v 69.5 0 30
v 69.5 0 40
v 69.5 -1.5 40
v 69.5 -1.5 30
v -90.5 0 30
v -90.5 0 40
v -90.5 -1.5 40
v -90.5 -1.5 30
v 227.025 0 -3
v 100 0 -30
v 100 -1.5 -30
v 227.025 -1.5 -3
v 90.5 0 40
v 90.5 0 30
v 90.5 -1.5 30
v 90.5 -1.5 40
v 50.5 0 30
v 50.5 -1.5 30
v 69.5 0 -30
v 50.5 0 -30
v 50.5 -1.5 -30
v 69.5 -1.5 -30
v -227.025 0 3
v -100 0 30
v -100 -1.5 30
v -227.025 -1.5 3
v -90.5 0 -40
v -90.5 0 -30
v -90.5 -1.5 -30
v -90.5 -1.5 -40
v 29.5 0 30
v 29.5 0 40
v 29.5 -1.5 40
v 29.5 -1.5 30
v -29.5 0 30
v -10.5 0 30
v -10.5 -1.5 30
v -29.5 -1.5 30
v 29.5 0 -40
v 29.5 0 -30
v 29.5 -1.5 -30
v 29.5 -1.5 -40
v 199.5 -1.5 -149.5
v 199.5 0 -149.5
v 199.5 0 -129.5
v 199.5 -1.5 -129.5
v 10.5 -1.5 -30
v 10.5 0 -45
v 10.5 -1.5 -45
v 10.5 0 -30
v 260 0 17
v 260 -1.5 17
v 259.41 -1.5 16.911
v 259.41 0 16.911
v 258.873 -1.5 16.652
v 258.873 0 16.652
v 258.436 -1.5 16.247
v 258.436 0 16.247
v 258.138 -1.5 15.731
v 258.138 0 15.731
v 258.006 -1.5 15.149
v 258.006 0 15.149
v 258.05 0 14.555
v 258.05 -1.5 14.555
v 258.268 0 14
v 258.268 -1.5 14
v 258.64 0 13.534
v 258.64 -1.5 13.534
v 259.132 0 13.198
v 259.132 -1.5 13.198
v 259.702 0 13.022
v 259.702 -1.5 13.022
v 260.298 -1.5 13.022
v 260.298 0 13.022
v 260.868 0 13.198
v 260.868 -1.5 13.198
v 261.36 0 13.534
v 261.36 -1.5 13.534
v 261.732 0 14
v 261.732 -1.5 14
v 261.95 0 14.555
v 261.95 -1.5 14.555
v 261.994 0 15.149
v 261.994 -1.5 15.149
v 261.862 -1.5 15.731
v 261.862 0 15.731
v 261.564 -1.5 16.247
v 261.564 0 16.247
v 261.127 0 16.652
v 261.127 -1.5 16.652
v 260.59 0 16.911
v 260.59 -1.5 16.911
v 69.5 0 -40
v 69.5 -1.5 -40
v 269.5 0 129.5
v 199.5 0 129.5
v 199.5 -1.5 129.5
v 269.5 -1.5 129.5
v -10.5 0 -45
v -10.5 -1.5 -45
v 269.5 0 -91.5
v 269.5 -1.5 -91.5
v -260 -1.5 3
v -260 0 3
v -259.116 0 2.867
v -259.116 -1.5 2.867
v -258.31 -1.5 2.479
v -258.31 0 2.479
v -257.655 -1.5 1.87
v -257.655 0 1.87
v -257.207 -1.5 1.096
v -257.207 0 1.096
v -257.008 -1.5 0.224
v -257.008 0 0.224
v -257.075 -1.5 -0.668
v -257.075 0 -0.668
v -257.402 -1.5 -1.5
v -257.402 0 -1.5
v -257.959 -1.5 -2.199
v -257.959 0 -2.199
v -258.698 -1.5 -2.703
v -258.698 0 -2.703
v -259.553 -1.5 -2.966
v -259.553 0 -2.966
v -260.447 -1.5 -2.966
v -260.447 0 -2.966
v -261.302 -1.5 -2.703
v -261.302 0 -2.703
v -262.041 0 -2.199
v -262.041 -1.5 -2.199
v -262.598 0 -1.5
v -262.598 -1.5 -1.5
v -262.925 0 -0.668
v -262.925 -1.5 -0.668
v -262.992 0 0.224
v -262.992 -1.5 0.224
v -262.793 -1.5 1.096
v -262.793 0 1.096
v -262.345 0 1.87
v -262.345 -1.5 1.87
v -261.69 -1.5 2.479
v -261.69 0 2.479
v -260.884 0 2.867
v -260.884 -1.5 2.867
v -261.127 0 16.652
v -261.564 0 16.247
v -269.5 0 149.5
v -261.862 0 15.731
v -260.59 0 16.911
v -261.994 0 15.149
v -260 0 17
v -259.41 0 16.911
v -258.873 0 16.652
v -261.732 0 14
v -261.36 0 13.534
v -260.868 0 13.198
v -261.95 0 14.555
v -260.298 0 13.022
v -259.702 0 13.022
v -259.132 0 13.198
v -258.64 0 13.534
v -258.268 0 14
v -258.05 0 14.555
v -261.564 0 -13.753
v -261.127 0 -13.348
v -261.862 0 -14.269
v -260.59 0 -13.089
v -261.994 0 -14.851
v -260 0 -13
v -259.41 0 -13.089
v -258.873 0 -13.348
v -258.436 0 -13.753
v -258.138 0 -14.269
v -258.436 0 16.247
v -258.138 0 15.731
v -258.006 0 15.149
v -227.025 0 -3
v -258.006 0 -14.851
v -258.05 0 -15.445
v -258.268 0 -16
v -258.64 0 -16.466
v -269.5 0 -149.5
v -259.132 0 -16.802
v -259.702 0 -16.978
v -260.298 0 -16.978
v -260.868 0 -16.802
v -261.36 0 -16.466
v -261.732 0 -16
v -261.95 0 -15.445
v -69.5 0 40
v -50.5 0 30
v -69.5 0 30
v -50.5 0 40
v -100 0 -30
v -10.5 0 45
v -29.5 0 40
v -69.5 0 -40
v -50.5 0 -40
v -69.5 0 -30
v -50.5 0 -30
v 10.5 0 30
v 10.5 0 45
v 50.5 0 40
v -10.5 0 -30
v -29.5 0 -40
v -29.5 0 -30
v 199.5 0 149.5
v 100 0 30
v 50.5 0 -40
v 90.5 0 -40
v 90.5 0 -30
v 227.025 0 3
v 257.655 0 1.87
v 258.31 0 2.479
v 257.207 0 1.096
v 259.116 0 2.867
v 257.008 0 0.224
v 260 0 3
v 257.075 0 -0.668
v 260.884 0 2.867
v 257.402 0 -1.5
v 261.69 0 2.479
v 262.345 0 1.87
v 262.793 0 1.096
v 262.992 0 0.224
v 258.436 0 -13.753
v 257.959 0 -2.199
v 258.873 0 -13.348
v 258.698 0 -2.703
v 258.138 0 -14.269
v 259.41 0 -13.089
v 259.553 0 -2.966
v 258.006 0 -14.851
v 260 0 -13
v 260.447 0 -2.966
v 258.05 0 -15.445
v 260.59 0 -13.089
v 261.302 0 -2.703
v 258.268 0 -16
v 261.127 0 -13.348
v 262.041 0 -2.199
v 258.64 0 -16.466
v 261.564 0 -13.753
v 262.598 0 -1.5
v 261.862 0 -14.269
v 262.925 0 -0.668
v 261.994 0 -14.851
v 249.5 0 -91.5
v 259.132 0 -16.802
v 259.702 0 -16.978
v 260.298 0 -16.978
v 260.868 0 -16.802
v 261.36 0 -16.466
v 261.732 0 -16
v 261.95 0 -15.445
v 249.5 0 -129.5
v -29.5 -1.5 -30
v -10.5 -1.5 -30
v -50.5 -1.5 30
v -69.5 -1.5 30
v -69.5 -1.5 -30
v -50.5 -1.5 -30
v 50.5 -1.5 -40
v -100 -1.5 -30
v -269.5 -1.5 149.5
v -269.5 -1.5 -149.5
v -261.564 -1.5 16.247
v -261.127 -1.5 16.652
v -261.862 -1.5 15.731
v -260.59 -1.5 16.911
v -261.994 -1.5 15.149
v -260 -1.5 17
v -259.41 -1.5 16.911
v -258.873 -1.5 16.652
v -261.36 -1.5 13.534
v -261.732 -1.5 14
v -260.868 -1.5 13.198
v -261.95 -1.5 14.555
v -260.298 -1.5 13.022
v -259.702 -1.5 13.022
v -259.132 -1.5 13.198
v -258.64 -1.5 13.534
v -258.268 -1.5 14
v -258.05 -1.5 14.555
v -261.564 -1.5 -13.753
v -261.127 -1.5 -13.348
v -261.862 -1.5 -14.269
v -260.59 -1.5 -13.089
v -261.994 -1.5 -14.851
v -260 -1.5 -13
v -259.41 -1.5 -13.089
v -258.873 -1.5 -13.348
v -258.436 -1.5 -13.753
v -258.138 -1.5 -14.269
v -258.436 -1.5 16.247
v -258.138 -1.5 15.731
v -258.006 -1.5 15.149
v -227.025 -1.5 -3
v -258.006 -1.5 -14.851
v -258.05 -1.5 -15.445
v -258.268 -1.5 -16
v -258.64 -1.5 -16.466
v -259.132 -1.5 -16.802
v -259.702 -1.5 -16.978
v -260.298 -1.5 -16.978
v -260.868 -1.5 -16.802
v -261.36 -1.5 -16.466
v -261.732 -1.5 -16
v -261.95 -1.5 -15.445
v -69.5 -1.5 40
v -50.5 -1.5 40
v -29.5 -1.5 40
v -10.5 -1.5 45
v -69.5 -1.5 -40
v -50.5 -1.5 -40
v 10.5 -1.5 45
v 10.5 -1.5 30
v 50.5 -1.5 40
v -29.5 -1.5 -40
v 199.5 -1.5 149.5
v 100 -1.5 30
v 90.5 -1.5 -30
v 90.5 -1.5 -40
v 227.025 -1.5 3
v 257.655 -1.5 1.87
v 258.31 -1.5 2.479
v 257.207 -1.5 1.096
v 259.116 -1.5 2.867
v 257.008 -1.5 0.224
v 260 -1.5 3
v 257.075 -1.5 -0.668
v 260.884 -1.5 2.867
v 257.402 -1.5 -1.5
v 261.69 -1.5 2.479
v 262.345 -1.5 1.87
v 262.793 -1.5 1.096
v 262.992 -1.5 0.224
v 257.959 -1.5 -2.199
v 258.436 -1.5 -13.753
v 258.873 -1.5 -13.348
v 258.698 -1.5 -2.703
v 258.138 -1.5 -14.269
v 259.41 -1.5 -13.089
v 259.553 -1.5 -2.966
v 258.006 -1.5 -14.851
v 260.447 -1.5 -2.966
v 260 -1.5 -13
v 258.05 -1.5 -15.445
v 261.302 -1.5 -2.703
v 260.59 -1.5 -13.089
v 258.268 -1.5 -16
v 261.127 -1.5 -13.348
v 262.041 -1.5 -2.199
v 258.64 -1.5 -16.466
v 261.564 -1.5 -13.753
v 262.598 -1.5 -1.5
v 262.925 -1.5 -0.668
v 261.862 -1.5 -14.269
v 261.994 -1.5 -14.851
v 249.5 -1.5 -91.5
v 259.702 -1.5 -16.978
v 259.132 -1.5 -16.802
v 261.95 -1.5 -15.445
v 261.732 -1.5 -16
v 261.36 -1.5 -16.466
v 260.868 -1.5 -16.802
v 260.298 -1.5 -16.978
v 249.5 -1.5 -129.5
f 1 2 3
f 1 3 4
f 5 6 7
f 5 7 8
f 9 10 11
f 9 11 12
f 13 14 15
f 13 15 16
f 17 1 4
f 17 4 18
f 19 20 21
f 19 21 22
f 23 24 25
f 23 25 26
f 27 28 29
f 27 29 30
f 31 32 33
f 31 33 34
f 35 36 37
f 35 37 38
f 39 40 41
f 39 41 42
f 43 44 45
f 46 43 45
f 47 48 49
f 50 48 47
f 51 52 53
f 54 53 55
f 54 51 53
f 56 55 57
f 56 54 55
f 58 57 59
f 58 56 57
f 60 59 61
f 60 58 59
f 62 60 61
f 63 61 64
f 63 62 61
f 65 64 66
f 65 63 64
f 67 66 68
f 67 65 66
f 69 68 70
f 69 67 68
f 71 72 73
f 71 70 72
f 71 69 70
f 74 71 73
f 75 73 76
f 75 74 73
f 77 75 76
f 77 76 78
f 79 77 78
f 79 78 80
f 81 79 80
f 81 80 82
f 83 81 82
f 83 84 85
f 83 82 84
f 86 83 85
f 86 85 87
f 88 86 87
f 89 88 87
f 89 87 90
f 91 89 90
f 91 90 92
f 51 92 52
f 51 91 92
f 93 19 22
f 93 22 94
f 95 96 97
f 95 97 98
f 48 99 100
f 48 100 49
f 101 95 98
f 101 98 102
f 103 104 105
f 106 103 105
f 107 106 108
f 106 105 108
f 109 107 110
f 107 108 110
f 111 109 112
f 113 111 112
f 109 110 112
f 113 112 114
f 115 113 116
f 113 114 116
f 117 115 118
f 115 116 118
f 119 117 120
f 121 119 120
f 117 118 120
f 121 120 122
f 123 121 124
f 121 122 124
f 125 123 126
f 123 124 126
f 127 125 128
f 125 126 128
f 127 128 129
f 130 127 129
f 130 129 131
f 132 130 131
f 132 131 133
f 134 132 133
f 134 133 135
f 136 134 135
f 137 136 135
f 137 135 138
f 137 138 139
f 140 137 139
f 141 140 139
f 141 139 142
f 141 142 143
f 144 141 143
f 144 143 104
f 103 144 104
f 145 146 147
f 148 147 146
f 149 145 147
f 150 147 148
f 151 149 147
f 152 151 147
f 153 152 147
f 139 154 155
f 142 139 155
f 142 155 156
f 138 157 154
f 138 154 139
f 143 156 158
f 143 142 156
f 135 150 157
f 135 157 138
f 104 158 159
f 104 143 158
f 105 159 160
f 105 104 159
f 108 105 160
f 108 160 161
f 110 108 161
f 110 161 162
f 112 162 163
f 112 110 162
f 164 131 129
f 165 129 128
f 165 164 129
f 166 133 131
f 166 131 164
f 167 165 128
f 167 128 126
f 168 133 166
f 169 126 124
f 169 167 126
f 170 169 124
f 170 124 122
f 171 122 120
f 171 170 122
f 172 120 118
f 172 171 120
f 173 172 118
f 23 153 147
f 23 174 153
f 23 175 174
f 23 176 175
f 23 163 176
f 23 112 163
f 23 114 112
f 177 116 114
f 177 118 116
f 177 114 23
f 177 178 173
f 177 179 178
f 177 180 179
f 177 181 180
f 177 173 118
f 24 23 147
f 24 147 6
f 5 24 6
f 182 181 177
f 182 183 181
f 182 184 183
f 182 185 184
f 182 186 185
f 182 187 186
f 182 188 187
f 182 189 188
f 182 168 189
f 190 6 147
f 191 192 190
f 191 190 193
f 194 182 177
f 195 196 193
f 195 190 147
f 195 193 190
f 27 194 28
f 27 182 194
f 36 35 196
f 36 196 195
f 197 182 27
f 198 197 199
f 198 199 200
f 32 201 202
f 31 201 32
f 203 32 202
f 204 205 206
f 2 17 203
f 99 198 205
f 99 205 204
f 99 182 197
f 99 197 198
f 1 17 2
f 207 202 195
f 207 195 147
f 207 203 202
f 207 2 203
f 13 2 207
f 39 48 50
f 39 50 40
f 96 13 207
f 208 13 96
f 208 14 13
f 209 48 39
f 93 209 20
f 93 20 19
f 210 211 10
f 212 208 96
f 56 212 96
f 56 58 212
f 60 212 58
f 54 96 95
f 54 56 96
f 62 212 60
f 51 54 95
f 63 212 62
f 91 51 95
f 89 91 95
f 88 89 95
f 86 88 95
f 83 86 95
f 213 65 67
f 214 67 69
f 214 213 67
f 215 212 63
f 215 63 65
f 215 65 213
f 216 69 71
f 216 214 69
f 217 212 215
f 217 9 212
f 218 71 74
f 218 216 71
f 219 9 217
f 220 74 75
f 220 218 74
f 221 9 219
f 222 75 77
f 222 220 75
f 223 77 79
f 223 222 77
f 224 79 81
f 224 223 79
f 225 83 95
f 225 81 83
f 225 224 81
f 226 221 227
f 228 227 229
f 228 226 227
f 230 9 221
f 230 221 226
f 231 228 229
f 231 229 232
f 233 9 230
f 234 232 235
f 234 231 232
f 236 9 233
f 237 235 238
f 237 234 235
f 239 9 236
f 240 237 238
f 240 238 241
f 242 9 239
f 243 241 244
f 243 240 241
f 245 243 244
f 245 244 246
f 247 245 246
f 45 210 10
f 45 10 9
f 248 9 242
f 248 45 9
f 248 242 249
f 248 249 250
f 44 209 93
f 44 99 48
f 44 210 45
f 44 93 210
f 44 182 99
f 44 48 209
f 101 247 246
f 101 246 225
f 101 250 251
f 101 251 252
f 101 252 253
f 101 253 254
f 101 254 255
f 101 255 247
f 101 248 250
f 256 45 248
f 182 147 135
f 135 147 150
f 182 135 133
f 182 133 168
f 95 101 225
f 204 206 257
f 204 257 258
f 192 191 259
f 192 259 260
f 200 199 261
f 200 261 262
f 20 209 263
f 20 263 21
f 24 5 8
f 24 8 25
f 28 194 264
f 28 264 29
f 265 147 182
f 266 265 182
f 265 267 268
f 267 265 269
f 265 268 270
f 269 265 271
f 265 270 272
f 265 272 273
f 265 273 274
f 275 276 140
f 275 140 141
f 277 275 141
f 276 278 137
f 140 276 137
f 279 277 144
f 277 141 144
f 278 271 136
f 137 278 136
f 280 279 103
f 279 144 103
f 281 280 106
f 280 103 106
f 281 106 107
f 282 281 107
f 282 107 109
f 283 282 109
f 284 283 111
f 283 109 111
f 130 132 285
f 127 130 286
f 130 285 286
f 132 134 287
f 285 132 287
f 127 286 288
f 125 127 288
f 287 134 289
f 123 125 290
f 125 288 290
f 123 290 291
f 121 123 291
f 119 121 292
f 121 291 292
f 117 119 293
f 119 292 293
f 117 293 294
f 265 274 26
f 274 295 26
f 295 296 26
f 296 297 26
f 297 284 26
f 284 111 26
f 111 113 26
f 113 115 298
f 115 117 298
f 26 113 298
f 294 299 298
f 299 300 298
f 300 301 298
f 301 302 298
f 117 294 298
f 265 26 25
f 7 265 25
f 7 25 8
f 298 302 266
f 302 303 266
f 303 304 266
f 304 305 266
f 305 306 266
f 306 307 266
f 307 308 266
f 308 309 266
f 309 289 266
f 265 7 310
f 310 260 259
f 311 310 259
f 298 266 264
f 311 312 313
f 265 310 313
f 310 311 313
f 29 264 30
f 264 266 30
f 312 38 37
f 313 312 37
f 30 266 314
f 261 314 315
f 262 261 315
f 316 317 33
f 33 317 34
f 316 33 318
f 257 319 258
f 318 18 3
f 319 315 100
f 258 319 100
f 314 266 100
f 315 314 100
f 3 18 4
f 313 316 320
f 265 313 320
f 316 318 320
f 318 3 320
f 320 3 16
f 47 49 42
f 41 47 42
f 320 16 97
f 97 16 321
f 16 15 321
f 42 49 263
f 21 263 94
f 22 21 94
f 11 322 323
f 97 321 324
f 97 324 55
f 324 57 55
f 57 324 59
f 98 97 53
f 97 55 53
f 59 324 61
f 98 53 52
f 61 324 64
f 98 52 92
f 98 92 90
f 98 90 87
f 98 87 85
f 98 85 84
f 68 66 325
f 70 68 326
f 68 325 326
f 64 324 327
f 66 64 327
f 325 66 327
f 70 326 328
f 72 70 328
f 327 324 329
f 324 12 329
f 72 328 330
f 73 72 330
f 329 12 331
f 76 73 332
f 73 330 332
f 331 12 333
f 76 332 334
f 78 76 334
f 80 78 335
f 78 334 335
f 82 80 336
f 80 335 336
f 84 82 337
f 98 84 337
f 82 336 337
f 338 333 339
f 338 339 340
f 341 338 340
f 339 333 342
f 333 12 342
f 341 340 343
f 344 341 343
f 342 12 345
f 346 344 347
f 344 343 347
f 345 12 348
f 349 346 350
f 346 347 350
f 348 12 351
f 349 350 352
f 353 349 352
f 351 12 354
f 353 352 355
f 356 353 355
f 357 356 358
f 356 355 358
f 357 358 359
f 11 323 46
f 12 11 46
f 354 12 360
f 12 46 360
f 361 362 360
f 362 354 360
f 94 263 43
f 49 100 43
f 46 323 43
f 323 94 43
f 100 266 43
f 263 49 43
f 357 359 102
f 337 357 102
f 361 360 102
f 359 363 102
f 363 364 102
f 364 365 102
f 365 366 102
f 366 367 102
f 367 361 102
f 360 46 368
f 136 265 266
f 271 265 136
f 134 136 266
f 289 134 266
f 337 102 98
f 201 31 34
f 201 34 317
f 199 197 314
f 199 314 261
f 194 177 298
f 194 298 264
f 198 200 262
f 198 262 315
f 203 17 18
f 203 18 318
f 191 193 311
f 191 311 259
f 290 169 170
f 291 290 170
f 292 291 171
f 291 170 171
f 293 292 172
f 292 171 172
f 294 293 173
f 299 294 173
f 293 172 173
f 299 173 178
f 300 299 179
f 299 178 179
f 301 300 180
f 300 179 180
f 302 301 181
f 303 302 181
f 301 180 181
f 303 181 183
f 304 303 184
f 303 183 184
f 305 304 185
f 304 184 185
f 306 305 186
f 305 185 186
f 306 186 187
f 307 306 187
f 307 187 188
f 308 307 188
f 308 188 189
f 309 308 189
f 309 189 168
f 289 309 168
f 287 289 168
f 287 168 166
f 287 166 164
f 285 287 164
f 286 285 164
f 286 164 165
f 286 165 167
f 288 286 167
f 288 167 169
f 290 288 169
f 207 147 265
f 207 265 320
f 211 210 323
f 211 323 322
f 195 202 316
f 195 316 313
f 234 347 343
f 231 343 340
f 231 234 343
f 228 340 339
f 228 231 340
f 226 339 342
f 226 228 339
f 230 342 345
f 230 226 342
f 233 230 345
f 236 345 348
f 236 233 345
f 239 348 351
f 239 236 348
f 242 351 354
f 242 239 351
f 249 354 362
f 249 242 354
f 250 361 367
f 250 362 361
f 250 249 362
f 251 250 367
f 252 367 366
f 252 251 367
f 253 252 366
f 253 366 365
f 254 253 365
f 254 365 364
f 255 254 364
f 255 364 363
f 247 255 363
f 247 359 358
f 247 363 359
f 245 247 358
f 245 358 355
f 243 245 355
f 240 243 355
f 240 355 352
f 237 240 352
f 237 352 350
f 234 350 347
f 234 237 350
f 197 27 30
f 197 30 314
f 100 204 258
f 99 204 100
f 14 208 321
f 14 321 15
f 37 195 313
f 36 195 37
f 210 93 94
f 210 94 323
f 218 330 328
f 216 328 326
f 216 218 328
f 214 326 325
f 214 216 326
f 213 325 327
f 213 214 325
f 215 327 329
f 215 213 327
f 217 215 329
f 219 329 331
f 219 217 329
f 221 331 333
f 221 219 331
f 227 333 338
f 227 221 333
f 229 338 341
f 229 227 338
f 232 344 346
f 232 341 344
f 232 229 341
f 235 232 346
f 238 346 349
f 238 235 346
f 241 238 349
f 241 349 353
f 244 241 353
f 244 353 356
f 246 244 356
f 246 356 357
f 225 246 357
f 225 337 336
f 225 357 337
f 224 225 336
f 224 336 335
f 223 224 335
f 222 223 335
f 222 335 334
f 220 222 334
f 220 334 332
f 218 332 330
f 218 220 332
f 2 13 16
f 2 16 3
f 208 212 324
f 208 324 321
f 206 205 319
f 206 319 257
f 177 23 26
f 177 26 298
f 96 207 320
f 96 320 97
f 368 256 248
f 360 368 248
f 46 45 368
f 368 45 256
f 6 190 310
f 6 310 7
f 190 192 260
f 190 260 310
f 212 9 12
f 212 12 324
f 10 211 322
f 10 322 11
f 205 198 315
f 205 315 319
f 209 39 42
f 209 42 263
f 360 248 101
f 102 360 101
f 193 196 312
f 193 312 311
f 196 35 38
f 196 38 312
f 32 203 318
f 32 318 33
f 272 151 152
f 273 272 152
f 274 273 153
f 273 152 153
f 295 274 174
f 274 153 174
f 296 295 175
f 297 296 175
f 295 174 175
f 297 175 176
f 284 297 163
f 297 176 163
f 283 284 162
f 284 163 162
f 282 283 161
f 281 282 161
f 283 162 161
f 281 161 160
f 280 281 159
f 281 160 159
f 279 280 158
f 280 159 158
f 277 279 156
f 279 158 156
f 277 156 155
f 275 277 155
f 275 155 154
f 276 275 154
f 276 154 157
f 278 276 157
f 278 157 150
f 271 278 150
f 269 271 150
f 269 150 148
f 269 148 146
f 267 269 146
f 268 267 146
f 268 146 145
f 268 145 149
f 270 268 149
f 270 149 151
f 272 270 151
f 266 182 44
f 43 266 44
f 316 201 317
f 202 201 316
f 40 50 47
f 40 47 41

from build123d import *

# Parameters (mm, degrees)
SKETCH1_W           = 539
SKETCH1_H           = 299
BOSS_EXTRUDE1_DEPTH = 1.5
SKETCH10_W          = 70
SKETCH10_H          = 20
CUT_EXTRUDE6_DEPTH  = 309.192715683
SKETCH2_R           = 3
SKETCH2_R_2         = 2
CUT_EXTRUDE1_DEPTH  = 10
CUT_EXTRUDE7_DEPTH  = 309.192715683


with BuildPart() as part:
    # Sketch1 → Boss-Extrude1 (new body)
    with BuildSketch(Plane(origin=(0, 0, 0), x_dir=(1, 0, 0), z_dir=(0, 1, 0))):
        Rectangle(SKETCH1_W, SKETCH1_H)
    extrude(amount=-BOSS_EXTRUDE1_DEPTH)

    # Sketch10 → Cut-Extrude6 (cut, through all)
    with BuildSketch(Plane(origin=(0, 0, 0), x_dir=(1, 0, 0), z_dir=(0, 1, 0))):
        Polygon((269.5, 149.5), (199.5, 149.5), (199.5, 129.5), (249.5, 129.5), (249.5, 91.5), (269.5, 91.5), align=None)
        with Locations((234.5, -139.5)):
            Rectangle(SKETCH10_W, SKETCH10_H)
    extrude(amount=-CUT_EXTRUDE6_DEPTH, mode=Mode.SUBTRACT)

    # Sketch2 → Cut-Extrude1 (cut)
    with BuildSketch(Plane(origin=(0, 0, 0), x_dir=(1, 0, 0), z_dir=(0, 1, 0))):
        with Locations(Location((-260, 0, 0), (0, 0, 270))):
            Circle(SKETCH2_R)
        with Locations(Location((-260, 15, 0), (0, 0, 270))):
            Circle(SKETCH2_R_2)
        with Locations(Location((-260, -15, 0), (0, 0, 270))):
            Circle(SKETCH2_R_2)
    cut_extrude1 = extrude(amount=-CUT_EXTRUDE1_DEPTH, mode=Mode.SUBTRACT)

    # Mirror1: Cut-Extrude1 across plane
    add(cut_extrude1.mirror(Plane(origin=(0, 0, 0), x_dir=(0, 0, 1), z_dir=(1, 0, 0))), mode=Mode.SUBTRACT)

    # Sketch11 → Cut-Extrude7 (cut, through all)
    with BuildSketch(Plane(origin=(0, 0, 0), x_dir=(1, 0, 0), z_dir=(0, 1, 0))):
        Polygon((227.025012956, 3), (227.025012956, -3), (100, -30), (90.5, -30), (90.5, -40), (69.5, -40), (69.5, -30), (50.5, -30), (50.5, -40), (29.5, -40), (29.5, -30), (10.5, -30), (10.5, -45), (-10.5, -45), (-10.5, -30), (-29.5, -30), (-29.5, -40), (-50.5, -40), (-50.5, -30), (-69.5, -30), (-69.5, -40), (-90.5, -40), (-90.5, -30), (-100, -30), (-227.025012956, -3), (-227.025012956, 3), (-100, 30), (-90.5, 30), (-90.5, 40), (-69.5, 40), (-69.5, 30), (-50.5, 30), (-50.5, 40), (-29.5, 40), (-29.5, 30), (-10.5, 30), (-10.5, 45), (10.5, 45), (10.5, 30), (29.5, 30), (29.5, 40), (50.5, 40), (50.5, 30), (69.5, 30), (69.5, 40), (90.5, 40), (90.5, 30), (100, 30), align=None)
    extrude(amount=-CUT_EXTRUDE7_DEPTH, mode=Mode.SUBTRACT)


solid = part.part
